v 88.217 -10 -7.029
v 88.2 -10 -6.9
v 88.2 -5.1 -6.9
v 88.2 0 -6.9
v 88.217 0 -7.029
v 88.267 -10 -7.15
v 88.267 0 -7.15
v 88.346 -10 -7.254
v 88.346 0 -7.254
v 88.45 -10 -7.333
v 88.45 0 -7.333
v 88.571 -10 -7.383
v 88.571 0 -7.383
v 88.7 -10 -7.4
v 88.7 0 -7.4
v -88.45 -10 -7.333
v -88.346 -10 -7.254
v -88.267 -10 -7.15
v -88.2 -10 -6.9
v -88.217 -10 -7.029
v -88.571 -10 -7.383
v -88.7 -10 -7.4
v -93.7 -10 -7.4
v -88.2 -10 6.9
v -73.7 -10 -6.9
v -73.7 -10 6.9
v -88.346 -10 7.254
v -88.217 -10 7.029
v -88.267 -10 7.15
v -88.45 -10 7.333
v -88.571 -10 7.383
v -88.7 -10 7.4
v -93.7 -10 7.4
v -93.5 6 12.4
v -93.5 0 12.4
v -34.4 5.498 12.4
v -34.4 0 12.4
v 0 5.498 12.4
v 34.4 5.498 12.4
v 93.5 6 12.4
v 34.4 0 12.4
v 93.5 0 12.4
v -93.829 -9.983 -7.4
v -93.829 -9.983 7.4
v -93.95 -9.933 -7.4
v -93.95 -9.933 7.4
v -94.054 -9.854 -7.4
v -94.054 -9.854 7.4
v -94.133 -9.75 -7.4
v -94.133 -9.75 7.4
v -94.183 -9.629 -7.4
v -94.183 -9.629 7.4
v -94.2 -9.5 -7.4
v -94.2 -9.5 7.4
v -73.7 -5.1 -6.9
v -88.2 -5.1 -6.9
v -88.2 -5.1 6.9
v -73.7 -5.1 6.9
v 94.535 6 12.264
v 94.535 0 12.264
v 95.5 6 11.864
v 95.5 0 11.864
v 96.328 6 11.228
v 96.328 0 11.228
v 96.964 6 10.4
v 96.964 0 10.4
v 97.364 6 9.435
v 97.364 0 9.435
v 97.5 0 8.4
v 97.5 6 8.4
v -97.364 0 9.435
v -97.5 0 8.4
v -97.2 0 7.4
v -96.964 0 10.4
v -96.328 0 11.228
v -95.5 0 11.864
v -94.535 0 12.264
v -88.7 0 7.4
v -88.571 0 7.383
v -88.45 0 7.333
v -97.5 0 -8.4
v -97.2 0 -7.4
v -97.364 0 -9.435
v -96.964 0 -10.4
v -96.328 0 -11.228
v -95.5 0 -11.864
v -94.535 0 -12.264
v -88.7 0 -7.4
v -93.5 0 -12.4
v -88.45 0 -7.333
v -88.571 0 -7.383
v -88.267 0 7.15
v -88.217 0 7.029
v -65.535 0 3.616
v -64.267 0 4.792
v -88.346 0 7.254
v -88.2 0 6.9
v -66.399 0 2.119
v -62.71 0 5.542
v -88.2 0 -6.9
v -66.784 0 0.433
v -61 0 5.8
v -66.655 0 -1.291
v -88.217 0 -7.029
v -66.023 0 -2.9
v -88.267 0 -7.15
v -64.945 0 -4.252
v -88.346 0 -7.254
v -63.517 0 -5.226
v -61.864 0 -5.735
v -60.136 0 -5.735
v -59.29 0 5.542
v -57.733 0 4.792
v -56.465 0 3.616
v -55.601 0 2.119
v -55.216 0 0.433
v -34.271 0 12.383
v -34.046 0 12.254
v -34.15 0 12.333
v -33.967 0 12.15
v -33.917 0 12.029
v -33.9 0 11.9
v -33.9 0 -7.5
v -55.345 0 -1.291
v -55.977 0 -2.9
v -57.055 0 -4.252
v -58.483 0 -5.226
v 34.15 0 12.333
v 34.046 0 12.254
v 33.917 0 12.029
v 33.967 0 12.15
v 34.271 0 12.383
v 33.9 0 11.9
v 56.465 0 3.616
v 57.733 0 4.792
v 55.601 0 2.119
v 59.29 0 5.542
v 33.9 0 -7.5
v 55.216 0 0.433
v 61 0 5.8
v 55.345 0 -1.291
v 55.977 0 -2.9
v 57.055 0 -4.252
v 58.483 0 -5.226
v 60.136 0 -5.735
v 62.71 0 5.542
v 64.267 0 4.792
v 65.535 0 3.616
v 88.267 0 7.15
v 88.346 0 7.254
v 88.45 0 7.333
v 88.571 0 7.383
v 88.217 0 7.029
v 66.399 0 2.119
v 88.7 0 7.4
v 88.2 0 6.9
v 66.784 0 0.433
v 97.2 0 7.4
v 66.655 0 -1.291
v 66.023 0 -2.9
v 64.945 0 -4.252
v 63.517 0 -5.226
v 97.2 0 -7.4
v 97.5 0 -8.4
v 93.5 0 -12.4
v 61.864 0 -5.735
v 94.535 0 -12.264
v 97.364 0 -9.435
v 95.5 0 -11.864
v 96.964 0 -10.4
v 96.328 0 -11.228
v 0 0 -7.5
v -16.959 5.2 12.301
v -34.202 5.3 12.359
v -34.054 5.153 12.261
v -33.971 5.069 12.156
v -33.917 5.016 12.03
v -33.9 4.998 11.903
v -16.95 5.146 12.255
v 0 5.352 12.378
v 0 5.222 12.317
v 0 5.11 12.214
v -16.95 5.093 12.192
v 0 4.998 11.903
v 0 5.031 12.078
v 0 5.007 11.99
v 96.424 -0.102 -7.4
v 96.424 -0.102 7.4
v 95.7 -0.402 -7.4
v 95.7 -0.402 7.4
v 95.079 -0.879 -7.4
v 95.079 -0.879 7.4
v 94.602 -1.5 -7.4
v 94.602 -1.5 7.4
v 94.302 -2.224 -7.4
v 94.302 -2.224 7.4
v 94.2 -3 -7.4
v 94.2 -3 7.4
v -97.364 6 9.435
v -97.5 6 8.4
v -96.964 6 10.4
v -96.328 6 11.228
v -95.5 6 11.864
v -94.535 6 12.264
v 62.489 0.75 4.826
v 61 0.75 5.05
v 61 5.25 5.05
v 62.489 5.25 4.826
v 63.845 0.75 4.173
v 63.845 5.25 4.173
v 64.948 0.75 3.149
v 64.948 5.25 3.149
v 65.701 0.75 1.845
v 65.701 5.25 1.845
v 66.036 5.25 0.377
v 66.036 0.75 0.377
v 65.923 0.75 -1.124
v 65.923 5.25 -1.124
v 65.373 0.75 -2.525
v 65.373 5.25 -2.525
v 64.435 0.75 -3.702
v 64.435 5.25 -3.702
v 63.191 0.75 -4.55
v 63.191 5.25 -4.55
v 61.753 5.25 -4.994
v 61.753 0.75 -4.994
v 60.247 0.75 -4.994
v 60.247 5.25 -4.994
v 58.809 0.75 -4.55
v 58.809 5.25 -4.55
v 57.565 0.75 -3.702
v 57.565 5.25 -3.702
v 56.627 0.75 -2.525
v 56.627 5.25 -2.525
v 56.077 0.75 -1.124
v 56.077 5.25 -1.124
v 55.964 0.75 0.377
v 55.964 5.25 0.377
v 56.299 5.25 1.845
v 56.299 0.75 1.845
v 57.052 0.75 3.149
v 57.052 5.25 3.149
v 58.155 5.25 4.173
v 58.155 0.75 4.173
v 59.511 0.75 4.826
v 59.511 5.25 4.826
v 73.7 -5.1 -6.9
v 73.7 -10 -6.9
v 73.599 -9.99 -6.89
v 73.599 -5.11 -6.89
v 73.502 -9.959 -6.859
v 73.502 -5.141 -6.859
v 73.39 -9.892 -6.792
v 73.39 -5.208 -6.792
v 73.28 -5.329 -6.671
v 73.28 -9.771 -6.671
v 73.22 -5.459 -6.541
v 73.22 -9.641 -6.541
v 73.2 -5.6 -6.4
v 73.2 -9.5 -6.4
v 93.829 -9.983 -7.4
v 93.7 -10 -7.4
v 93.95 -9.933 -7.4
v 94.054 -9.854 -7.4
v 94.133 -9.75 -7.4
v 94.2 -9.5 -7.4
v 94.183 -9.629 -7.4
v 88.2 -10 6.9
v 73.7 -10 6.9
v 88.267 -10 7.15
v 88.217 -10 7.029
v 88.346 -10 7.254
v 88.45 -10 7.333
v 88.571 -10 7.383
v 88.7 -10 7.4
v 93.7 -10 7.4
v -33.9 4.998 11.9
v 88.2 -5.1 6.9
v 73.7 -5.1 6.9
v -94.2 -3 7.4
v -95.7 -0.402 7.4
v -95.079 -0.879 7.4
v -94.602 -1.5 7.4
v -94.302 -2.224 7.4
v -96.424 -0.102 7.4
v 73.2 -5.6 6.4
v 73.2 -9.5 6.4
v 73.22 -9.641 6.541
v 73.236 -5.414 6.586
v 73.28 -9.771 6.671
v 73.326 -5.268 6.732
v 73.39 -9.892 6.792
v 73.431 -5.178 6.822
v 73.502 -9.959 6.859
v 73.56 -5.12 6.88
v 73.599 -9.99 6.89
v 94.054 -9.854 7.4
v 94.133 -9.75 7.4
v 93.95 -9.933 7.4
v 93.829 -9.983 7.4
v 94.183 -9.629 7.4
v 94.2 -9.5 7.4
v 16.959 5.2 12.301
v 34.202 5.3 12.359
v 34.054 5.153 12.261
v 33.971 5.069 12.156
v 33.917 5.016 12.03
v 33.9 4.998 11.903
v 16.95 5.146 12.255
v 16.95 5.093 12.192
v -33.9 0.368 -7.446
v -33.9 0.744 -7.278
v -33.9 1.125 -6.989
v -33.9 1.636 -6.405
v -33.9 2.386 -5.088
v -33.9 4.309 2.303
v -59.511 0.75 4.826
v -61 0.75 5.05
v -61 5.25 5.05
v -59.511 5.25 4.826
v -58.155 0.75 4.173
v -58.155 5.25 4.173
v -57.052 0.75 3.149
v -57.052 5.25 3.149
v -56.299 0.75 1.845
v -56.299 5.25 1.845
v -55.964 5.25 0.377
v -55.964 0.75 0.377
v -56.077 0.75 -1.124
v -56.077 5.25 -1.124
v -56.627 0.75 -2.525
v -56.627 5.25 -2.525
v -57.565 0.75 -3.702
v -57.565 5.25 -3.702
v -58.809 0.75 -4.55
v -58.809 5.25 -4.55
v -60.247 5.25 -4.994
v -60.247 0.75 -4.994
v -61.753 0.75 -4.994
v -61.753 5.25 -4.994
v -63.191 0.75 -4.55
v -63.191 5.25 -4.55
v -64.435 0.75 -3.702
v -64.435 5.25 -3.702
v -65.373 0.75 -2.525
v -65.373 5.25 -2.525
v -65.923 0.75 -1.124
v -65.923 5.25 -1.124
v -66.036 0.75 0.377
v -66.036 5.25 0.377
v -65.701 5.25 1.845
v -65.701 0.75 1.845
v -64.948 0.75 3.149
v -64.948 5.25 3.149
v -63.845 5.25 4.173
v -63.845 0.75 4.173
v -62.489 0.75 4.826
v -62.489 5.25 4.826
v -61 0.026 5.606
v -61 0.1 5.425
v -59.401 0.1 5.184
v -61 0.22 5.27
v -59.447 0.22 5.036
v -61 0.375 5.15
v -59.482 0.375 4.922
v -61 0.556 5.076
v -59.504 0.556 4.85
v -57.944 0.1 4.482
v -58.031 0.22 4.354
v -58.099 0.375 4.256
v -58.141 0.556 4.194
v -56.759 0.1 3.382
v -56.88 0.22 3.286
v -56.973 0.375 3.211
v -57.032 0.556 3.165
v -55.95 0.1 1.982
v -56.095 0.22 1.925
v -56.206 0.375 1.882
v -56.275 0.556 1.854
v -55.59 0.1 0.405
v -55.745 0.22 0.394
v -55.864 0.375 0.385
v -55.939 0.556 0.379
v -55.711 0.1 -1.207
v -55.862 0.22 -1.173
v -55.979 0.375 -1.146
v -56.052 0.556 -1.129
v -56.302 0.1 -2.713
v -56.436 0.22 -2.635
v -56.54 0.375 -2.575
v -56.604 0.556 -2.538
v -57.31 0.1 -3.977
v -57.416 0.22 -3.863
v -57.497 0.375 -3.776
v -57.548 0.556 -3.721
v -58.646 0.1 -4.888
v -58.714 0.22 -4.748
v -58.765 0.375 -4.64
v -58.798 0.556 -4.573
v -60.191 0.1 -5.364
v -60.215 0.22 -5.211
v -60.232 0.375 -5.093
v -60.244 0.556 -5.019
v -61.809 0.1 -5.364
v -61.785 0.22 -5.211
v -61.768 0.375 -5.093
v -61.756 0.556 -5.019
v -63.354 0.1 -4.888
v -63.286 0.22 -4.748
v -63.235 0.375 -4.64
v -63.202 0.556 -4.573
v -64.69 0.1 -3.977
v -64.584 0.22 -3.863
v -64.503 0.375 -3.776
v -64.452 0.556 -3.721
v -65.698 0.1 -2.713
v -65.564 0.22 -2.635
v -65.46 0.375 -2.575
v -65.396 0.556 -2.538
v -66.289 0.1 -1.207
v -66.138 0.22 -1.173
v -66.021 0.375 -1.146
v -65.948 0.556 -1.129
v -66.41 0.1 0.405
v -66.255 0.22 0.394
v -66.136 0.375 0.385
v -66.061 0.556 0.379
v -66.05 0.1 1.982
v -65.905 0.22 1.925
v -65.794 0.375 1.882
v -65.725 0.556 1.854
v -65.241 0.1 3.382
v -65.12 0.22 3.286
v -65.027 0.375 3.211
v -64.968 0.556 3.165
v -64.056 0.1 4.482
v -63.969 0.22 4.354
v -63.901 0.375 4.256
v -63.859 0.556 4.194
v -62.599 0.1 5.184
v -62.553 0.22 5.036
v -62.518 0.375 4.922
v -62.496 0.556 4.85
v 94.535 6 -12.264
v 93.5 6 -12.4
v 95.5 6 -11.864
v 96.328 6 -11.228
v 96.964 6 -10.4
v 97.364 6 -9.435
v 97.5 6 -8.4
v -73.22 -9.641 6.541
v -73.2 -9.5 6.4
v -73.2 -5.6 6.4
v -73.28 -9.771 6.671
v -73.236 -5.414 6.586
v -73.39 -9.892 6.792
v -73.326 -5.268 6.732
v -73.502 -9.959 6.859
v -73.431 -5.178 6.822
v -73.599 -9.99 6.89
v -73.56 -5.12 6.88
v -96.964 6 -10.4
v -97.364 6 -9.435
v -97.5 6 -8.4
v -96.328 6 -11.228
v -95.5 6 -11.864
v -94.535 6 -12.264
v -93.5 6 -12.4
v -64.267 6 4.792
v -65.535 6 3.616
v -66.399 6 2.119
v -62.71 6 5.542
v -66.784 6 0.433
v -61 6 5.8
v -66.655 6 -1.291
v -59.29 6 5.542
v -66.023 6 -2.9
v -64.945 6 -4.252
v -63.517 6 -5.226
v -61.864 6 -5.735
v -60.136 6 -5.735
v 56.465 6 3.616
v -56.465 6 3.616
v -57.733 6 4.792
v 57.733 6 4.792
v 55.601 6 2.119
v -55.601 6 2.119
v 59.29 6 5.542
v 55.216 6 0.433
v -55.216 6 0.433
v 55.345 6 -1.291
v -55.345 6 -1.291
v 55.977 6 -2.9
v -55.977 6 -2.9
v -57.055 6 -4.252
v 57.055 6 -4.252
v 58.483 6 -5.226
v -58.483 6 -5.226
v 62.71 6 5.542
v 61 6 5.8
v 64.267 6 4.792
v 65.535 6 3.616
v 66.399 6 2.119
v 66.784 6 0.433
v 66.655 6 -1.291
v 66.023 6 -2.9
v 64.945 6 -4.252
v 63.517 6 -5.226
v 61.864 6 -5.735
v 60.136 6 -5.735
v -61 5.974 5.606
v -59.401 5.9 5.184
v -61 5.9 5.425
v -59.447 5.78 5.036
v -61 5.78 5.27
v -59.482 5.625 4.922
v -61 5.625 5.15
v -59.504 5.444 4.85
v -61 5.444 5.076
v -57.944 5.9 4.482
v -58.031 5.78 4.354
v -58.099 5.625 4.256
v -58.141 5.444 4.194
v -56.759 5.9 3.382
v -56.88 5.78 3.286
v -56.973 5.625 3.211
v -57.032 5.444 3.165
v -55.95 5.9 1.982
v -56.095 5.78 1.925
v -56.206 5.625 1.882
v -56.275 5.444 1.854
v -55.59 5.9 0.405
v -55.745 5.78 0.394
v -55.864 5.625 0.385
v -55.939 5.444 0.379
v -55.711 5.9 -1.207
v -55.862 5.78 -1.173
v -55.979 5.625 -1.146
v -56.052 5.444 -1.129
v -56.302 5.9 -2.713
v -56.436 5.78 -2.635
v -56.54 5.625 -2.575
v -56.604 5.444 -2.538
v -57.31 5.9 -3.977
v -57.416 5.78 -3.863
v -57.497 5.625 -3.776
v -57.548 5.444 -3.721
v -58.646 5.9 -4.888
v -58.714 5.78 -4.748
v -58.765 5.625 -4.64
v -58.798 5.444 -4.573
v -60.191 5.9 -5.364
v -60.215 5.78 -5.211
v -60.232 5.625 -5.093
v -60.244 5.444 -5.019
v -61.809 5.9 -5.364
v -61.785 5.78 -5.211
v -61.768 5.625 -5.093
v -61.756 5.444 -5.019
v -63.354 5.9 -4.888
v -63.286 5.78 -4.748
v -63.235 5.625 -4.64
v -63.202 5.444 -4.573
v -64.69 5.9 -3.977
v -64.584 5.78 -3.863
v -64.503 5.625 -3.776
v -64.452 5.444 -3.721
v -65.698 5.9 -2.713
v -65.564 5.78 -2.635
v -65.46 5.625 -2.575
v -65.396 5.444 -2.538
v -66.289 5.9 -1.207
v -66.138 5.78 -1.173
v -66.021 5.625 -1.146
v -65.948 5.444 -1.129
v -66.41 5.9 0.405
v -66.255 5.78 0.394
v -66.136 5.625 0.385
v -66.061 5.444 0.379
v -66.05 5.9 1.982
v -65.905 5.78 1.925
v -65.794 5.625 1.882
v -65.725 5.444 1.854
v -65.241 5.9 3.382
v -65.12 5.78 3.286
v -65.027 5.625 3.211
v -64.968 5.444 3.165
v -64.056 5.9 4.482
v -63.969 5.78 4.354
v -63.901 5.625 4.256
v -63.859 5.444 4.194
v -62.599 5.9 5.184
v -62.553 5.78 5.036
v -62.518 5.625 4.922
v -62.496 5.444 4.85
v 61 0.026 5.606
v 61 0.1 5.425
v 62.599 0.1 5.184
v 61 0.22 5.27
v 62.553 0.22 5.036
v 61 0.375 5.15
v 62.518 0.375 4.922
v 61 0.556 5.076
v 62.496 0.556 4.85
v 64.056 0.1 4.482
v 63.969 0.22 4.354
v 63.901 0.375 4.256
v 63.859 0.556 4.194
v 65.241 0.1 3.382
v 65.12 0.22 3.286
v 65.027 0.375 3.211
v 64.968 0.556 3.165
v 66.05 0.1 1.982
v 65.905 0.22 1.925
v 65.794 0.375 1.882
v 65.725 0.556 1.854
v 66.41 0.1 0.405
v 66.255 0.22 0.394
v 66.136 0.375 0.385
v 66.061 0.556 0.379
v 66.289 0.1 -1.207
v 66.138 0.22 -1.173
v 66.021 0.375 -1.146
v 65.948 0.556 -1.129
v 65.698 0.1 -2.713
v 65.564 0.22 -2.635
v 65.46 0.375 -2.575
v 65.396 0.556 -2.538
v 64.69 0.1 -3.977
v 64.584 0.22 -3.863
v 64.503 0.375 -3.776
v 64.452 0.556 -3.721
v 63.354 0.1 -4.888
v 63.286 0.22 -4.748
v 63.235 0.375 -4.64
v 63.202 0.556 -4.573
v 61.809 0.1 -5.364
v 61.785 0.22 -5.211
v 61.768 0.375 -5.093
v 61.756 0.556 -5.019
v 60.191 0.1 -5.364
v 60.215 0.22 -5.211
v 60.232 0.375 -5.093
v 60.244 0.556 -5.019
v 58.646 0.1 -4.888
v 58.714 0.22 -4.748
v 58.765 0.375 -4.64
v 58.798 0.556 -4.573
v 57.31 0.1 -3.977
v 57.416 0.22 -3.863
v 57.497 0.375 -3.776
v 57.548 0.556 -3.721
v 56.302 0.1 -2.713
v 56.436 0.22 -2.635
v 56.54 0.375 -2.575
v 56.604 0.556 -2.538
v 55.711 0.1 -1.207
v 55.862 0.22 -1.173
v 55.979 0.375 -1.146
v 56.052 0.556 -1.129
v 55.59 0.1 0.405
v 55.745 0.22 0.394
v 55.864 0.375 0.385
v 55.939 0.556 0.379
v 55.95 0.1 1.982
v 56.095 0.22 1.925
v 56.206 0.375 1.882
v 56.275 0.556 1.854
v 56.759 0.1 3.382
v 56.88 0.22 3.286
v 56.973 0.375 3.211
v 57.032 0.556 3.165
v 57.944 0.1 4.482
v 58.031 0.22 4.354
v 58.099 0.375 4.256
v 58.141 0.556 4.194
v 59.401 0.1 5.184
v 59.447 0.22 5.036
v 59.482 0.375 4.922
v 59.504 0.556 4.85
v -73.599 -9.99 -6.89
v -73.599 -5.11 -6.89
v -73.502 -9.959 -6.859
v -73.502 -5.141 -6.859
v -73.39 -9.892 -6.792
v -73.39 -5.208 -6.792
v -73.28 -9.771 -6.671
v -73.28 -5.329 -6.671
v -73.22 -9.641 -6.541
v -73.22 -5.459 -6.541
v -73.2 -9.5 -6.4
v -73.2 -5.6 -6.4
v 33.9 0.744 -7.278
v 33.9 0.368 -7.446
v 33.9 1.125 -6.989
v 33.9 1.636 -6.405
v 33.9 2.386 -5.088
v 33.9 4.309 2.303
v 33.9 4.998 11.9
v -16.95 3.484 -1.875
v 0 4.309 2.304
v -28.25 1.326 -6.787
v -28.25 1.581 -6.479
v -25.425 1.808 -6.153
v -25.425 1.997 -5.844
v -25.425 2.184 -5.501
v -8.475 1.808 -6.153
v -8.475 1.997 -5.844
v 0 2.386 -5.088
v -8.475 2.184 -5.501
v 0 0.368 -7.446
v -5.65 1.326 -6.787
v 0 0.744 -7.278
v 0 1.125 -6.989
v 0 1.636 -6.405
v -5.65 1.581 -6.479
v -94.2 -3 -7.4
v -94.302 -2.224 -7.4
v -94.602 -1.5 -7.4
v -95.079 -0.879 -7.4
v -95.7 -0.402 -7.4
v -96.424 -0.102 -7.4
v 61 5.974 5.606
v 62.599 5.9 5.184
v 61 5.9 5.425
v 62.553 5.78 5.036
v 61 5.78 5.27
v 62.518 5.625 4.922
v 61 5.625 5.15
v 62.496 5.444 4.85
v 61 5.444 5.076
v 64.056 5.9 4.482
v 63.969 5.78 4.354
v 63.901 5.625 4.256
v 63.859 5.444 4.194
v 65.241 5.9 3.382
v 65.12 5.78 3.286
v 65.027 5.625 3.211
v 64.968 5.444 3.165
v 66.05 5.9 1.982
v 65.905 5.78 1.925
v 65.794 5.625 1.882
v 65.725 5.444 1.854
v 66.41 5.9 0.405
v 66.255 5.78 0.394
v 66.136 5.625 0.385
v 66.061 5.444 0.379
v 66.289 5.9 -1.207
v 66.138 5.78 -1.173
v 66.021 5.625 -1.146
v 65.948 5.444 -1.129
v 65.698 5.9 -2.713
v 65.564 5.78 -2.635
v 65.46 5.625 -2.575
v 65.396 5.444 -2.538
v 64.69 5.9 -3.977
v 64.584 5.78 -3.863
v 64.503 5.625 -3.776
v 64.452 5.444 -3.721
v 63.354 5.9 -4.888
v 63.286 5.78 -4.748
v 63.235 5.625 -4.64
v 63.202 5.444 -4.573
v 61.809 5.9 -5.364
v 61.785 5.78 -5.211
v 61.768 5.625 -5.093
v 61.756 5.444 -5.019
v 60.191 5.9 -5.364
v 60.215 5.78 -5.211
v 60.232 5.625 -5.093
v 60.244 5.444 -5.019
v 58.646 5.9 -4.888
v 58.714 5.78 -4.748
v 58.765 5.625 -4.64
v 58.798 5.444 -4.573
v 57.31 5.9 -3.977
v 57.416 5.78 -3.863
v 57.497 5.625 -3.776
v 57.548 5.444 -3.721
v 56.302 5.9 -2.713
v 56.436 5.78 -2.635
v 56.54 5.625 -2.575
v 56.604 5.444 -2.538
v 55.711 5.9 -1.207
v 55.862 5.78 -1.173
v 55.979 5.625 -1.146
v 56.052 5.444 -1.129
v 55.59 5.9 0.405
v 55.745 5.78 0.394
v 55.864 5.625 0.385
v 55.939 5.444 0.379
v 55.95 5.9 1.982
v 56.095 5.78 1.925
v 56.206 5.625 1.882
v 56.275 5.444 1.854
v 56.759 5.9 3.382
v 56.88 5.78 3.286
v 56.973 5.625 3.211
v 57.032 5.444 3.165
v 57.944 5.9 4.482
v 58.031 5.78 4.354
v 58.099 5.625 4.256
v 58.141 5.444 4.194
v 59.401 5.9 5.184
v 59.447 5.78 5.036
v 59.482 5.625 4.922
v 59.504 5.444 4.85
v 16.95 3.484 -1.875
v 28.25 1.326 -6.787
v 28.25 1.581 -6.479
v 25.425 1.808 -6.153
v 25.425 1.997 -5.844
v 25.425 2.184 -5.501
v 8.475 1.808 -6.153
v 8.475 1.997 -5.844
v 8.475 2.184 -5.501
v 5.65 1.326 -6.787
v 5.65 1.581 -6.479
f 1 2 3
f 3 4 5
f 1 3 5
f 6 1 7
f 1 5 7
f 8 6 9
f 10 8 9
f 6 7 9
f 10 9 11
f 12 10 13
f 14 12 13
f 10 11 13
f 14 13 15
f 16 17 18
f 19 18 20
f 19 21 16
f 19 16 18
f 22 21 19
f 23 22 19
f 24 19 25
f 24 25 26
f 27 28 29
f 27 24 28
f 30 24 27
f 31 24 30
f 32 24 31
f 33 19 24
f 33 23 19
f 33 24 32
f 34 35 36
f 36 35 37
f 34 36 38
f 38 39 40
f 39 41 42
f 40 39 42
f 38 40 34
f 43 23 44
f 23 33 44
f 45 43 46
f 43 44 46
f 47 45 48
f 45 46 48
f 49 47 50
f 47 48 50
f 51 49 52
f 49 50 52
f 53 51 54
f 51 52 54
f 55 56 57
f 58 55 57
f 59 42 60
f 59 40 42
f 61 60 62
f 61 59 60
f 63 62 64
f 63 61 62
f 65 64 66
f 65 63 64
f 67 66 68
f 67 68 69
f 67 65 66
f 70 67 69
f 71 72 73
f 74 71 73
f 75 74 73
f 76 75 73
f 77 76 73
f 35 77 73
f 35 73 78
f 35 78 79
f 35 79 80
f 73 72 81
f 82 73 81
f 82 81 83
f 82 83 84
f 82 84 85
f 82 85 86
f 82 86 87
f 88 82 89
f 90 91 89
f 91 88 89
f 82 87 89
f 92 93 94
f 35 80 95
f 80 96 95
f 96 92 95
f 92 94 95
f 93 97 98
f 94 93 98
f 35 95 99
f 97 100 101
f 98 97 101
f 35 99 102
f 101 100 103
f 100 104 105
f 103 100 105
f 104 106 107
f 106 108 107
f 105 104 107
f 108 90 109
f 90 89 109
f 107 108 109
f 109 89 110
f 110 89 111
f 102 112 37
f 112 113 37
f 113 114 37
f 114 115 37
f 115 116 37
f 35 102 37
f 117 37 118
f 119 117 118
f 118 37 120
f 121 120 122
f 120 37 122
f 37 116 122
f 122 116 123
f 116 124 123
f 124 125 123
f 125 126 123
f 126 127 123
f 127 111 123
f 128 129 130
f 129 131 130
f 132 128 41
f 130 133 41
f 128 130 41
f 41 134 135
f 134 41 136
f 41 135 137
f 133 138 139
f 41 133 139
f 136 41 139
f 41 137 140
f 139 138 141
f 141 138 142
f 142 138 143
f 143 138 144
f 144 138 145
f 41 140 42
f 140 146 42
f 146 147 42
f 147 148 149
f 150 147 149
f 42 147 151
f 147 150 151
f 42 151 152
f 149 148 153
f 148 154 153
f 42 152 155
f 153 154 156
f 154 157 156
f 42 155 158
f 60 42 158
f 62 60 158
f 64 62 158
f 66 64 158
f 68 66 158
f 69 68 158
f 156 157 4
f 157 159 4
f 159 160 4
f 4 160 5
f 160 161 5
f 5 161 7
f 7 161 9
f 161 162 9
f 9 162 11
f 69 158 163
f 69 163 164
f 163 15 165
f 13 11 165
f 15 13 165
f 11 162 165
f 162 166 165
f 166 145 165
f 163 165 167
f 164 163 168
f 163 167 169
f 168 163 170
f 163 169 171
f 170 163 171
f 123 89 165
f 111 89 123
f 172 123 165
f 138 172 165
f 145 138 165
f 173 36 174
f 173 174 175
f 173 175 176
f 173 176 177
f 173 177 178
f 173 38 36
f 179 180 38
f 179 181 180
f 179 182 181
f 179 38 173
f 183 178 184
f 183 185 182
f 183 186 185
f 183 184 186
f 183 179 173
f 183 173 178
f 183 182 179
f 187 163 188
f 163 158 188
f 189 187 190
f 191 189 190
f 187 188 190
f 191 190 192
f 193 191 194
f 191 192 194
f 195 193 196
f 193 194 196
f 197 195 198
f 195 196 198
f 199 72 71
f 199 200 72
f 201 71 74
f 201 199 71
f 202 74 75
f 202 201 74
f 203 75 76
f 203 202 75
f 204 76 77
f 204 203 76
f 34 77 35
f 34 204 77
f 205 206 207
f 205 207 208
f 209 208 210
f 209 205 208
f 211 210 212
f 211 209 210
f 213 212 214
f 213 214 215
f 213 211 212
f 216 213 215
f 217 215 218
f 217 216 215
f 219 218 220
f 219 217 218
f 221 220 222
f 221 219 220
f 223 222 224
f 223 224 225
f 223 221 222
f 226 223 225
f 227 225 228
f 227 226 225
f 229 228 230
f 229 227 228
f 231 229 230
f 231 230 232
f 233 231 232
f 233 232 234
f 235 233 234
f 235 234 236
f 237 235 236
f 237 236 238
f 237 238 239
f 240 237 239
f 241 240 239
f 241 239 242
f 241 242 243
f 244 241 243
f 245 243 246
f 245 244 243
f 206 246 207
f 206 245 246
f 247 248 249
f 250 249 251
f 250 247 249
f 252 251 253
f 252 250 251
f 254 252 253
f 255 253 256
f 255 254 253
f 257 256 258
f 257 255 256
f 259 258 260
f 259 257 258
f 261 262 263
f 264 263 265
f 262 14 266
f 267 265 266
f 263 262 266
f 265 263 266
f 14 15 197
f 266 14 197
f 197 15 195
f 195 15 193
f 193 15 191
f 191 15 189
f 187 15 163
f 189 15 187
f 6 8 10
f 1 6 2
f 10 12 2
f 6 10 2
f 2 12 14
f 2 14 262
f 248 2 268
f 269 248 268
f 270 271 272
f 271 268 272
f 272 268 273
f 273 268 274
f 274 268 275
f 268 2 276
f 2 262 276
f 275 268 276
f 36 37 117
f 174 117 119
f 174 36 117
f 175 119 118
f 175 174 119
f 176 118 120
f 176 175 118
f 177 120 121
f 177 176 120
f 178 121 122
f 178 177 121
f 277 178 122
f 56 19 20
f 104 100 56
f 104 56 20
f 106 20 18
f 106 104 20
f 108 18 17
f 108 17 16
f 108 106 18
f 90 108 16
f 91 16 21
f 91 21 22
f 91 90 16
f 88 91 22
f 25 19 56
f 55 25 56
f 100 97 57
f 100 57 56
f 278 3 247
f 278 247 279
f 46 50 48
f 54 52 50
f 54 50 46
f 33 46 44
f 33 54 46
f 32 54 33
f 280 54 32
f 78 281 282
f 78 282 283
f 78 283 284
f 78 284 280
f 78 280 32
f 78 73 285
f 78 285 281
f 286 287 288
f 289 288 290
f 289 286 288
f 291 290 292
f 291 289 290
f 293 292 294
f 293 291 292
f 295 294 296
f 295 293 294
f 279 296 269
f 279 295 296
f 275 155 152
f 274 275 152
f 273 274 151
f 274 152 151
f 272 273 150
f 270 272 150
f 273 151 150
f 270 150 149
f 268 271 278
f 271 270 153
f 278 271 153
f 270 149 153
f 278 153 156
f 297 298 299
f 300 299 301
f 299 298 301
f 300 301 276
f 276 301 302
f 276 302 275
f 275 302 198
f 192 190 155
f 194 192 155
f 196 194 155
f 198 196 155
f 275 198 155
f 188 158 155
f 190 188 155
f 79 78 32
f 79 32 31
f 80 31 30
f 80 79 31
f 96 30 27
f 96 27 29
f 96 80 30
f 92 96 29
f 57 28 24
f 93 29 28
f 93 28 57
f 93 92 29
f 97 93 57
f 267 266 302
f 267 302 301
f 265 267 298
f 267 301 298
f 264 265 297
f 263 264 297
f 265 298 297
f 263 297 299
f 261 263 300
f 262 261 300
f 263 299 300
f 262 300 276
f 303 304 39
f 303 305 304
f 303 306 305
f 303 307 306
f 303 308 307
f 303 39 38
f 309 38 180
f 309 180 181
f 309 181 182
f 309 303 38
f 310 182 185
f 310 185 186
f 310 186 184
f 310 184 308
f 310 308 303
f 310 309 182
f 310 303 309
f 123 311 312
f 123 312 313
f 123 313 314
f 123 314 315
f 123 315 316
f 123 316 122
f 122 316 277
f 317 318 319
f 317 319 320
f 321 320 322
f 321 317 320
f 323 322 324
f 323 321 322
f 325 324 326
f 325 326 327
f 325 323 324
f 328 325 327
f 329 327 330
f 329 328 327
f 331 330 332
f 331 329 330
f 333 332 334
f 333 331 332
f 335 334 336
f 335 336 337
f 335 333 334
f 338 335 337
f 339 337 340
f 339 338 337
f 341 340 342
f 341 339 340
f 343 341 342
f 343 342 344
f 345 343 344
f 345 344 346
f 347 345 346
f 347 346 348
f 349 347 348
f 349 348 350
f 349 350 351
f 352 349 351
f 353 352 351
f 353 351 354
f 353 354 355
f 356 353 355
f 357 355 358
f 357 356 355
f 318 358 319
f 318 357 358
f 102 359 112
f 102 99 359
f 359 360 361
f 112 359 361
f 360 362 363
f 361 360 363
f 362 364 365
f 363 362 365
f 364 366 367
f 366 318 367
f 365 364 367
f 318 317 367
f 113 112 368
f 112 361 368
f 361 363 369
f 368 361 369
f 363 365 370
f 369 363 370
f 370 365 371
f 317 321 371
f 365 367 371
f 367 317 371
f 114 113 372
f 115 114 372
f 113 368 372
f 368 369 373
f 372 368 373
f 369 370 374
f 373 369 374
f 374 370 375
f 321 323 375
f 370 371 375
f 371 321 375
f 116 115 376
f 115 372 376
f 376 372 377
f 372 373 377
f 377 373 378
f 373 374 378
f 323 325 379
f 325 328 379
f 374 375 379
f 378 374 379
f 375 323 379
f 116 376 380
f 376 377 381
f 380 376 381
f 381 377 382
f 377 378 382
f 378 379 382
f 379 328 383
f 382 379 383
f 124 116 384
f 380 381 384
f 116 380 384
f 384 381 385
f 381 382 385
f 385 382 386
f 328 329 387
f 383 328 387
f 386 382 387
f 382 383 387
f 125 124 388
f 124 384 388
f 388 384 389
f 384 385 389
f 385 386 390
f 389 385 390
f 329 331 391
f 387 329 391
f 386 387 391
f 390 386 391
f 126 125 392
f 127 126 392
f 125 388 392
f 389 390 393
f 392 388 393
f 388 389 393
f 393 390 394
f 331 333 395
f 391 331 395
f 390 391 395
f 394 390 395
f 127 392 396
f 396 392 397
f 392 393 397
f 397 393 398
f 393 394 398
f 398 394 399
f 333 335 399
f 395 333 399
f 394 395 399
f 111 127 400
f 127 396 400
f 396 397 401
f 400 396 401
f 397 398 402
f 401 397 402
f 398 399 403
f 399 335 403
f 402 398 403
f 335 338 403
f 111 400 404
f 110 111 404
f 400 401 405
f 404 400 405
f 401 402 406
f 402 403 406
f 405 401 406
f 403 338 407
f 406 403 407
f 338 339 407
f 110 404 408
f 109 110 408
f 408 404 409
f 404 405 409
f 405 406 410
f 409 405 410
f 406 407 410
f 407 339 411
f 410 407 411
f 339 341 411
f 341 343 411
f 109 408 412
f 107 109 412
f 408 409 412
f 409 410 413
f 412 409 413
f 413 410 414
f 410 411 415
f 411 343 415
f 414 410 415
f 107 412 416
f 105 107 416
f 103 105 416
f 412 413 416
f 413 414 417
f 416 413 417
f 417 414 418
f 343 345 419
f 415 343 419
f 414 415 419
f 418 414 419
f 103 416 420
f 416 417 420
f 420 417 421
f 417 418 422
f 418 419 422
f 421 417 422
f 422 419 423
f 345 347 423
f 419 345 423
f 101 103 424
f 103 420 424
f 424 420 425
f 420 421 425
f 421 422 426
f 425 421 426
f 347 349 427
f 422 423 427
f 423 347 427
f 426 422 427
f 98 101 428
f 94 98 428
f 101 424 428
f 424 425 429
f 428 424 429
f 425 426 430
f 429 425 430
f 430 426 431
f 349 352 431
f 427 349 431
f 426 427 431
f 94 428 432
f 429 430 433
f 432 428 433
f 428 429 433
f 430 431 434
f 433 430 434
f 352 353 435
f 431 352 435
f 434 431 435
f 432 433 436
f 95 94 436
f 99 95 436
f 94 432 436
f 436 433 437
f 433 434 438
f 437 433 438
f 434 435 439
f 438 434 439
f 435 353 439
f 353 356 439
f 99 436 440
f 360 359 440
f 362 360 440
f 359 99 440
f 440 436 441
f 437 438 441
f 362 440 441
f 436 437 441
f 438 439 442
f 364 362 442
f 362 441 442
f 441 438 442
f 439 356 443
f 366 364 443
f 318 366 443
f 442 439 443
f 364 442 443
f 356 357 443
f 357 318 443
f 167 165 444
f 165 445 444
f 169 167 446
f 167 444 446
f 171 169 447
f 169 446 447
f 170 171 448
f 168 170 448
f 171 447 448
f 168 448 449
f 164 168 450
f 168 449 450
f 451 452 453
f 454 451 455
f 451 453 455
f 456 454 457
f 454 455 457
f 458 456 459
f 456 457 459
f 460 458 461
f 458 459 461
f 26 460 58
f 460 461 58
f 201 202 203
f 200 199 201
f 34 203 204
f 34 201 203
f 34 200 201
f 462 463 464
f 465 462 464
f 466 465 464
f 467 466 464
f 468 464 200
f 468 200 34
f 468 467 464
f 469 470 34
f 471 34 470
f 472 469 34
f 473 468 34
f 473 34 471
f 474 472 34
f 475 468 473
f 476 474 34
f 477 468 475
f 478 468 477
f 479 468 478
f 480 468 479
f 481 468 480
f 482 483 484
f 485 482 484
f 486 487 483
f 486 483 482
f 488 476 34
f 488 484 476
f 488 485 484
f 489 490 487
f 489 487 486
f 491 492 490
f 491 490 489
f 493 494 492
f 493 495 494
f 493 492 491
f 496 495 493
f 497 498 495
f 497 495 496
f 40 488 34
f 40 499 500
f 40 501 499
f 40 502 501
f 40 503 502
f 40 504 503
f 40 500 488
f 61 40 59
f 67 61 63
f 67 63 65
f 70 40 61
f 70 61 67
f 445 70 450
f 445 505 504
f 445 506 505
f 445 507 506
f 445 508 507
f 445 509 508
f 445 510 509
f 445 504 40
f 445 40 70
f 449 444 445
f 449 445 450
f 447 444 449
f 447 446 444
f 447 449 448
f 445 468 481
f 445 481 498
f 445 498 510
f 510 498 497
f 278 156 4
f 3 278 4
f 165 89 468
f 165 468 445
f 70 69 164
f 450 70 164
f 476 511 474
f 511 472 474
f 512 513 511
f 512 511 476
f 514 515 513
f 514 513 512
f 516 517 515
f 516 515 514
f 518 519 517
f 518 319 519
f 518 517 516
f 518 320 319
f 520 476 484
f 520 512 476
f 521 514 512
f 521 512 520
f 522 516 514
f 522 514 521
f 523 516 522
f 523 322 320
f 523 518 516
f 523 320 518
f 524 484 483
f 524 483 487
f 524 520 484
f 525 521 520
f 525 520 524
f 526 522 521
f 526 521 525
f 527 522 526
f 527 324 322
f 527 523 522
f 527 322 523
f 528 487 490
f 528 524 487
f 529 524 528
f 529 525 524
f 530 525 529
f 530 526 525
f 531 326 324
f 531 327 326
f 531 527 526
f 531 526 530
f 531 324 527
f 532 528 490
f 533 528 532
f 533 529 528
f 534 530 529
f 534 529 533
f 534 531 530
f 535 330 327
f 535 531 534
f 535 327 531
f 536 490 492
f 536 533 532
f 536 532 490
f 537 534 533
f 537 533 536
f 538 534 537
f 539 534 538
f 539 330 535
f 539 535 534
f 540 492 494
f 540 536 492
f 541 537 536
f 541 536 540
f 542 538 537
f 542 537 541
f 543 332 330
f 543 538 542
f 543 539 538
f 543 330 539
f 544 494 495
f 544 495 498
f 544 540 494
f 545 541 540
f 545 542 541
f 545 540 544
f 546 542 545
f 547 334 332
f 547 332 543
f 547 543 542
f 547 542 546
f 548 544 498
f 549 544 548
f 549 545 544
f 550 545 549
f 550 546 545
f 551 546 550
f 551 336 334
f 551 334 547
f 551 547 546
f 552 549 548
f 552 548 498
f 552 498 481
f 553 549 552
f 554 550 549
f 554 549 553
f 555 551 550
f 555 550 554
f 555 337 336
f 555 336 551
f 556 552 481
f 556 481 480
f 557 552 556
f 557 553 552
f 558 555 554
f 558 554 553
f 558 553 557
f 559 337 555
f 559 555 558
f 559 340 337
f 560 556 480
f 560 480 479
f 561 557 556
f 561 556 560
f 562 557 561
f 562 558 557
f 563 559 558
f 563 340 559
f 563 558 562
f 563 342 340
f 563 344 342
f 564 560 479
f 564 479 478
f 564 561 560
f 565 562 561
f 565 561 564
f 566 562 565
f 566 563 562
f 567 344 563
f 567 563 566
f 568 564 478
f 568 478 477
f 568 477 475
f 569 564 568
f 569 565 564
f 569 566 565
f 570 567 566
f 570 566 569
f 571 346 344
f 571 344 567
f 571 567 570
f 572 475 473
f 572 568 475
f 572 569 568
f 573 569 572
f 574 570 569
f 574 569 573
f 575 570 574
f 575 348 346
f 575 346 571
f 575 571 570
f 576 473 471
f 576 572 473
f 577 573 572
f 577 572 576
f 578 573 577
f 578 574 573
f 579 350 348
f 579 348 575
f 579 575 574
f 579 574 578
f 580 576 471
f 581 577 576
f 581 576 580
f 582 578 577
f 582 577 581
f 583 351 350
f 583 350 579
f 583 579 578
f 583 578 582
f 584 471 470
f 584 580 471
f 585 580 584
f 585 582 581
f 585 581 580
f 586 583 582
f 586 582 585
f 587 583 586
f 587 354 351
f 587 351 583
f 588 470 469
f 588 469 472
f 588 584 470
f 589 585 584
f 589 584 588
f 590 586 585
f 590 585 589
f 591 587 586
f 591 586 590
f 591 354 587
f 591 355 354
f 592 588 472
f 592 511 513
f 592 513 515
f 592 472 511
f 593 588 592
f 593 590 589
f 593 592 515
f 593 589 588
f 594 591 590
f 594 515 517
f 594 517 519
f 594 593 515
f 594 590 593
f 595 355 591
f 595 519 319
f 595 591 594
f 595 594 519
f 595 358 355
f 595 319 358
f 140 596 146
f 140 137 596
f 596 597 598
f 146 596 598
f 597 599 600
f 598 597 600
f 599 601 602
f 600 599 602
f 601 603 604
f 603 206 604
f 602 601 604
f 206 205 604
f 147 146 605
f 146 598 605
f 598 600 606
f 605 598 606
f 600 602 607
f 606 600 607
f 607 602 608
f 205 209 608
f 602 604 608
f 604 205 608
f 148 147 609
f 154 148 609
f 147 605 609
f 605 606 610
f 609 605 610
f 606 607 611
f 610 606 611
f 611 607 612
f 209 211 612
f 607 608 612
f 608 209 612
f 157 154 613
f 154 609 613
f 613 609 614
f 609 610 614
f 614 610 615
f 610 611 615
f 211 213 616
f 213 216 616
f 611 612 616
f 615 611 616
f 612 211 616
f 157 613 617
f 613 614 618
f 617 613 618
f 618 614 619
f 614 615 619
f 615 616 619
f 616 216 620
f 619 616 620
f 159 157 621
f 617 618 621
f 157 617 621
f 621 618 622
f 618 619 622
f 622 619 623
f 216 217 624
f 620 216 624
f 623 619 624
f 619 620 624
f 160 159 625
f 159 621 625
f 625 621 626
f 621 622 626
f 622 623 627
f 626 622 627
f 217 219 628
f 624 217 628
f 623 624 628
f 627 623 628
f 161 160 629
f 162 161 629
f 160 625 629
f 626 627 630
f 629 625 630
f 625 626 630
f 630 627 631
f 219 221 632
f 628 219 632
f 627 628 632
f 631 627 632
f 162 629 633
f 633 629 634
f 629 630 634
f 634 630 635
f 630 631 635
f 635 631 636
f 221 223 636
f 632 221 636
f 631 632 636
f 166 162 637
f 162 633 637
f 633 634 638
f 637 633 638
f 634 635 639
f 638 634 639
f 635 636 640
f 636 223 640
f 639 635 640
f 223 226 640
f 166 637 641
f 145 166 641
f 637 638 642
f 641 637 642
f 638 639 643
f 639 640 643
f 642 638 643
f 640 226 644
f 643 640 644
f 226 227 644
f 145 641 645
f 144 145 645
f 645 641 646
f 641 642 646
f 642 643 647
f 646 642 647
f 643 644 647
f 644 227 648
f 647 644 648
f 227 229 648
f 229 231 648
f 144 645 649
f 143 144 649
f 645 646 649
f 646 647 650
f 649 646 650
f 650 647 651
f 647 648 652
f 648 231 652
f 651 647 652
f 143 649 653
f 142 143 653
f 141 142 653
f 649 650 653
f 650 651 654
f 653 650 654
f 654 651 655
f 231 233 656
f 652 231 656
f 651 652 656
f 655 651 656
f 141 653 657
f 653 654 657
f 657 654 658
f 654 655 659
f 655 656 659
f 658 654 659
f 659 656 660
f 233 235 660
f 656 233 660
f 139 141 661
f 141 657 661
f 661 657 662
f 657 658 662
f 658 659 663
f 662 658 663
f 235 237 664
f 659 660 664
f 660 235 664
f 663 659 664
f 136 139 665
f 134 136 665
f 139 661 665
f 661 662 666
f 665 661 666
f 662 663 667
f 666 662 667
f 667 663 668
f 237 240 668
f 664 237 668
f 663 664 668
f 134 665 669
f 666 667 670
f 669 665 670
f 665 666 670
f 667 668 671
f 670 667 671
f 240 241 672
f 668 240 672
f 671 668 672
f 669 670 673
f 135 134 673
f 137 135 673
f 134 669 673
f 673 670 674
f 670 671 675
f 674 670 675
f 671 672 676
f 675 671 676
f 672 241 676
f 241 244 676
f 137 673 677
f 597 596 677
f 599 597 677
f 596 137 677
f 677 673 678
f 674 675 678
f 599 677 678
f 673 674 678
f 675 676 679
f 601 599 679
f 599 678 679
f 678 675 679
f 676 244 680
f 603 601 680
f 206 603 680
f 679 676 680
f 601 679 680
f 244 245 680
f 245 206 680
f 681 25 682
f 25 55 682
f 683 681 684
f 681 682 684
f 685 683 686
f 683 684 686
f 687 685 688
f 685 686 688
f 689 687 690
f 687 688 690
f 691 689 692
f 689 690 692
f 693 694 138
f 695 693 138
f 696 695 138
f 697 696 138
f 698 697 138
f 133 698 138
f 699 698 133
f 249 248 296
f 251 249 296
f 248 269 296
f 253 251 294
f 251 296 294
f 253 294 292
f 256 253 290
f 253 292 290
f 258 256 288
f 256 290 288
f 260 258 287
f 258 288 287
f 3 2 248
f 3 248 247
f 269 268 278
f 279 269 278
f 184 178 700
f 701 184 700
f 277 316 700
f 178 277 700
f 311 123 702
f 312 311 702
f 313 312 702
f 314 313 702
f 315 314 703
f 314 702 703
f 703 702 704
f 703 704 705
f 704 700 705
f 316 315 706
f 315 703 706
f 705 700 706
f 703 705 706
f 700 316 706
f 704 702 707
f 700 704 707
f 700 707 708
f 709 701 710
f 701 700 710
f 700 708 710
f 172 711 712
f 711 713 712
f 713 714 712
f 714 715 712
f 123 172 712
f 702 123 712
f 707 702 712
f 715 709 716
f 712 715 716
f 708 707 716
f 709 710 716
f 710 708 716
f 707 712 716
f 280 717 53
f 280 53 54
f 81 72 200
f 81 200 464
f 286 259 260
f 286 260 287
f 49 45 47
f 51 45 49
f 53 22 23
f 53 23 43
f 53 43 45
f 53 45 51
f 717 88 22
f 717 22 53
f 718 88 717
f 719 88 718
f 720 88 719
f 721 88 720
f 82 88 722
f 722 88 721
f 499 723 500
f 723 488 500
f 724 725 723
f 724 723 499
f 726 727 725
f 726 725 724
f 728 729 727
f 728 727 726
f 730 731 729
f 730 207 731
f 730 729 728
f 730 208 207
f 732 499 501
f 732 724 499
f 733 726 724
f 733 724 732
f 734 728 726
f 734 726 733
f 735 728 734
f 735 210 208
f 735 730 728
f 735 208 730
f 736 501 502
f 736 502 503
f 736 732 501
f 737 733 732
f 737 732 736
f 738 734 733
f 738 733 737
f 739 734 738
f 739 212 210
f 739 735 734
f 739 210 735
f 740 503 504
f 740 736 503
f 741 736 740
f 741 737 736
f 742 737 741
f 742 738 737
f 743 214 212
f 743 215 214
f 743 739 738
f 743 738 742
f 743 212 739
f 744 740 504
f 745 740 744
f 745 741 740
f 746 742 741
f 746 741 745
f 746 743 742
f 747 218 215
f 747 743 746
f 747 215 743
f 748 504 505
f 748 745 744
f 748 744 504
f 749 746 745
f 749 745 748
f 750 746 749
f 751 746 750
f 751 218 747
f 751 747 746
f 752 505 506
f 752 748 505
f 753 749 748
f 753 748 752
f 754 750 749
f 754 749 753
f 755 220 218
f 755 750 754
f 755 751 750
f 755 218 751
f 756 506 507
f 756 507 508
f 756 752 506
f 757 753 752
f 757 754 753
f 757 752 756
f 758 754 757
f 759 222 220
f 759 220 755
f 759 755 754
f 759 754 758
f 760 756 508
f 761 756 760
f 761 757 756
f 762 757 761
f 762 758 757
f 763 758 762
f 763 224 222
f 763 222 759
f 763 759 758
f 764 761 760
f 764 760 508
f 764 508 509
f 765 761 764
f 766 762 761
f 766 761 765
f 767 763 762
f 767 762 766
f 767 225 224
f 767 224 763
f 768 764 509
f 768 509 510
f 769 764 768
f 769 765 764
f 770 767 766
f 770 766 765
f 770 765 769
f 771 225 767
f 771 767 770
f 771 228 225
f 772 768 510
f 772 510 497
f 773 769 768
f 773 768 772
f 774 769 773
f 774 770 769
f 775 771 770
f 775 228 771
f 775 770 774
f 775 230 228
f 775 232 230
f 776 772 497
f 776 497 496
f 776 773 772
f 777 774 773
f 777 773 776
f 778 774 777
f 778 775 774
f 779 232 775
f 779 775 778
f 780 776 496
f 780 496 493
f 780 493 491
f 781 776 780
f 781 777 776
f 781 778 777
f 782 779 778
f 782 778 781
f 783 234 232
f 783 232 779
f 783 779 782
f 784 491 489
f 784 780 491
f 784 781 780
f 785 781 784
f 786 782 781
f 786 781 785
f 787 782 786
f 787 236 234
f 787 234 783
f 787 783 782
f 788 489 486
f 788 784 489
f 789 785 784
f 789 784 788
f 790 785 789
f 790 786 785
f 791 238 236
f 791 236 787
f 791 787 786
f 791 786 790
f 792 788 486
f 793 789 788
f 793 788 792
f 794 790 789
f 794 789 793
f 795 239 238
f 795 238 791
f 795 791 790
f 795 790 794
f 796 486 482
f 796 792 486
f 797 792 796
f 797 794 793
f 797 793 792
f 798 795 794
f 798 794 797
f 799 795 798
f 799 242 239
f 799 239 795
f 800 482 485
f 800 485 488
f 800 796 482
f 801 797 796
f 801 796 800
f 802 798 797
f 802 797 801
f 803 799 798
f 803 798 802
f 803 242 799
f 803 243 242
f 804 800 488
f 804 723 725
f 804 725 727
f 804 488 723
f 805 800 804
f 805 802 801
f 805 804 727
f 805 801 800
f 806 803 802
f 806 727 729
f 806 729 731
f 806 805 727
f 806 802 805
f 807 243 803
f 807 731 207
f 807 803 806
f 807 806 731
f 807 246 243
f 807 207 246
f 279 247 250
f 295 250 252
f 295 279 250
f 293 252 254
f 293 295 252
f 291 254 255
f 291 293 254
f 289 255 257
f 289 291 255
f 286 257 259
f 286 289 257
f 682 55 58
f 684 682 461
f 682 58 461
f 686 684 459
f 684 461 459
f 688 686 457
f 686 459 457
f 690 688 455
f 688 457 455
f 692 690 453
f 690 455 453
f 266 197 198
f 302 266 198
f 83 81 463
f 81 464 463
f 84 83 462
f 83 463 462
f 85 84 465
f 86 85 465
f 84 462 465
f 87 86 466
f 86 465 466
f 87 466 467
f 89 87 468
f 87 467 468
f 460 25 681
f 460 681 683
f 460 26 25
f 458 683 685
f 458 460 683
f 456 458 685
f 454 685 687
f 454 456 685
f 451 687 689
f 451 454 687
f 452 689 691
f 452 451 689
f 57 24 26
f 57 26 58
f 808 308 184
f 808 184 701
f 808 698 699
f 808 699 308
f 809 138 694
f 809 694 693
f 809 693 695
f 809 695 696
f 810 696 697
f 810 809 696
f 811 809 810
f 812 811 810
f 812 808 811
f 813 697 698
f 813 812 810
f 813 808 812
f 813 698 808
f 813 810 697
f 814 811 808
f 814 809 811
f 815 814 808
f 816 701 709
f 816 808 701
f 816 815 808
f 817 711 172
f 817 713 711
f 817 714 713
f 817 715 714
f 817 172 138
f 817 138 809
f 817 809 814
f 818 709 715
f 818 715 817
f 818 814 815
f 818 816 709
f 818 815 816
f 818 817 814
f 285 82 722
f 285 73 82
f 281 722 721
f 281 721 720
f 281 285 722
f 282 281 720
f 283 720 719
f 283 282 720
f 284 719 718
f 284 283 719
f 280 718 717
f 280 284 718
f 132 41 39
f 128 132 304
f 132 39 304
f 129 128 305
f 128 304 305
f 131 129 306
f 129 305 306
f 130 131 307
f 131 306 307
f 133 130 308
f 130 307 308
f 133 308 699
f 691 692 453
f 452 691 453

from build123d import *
from OCP.BRepFilletAPI import BRepFilletAPI_MakeFillet

# Parameters (mm, degrees)
SKETCH1_W             = 195
SKETCH1_H             = 24.8
SKETCH1_R             = 5.05
BOSS_EXTRUDE1_DEPTH   = 6
CUT_EXTRUDE1_DEPTH    = 33.9
FILLET1_R1            = 0.75
FILLET1_R2            = 4
FILLET1_R3            = 0.5
BOSS_EXTRUDE2_DEPTH   = 10
FILLET2_R1            = 3
FILLET2_R2            = 0.5
SKETCH5_W             = 13.8
SKETCH5_H             = 4.9
BOSS_EXTRUDE4_DEPTH   = 15
FILLET3_R             = 0.5
FILLET2_OF_MIRROR2_R1 = 3
FILLET2_OF_MIRROR2_R2 = 0.5
FILLET3_OF_MIRROR2_R  = 0.5


with BuildPart() as part:
    # Sketch1 → Boss-Extrude1 (new body)
    with BuildSketch(Plane(origin=(0, 0, 0), x_dir=(1, 0, 0), z_dir=(0, 1, 0))):
        Rectangle(SKETCH1_W, SKETCH1_H)
        with Locations(Location((-61, 0, 0), (0, 0, 270))):
            Circle(SKETCH1_R, mode=Mode.SUBTRACT)
        with Locations(Location((61, 0, 0), (0, 0, 270))):
            Circle(SKETCH1_R, mode=Mode.SUBTRACT)
    extrude(amount=BOSS_EXTRUDE1_DEPTH)

    # Sketch2 → Cut-Extrude1 (cut, symmetric)
    with BuildSketch(Plane(origin=(0, 0, 0), x_dir=(0, 0, -1), z_dir=(1, 0, 0))):
        with BuildLine():
            Line((-12.4, 0), (-12.4, 5))
            add(Edge.make_bspline(
                [(7.5, 0), (7.5, 5), (-12.4, 5)],
                knots=[3.141592654, 3.141592654, 3.141592654, 4.71238898, 4.71238898, 4.71238898], degree=2, weights=[1, 0.707106781, 1]))
            Line((7.5, 0), (-12.4, 0))
        make_face()
    extrude(amount=CUT_EXTRUDE1_DEPTH, both=True, mode=Mode.SUBTRACT)

    # Fillet1: one fillet with a radius per group of edges: ONE call of the kernel's fillet builder (fillet() takes one radius for all edges)
    fillet1_edges_1 = [part.edges().sort_by_distance(p)[0] for p in [
        (-61, 0, -5.05),
        (-61, 6, -5.05),
        (61, 0, -5.05),
        (61, 6, -5.05),
    ]]
    fillet1_edges_2 = [part.edges().sort_by_distance(p)[0] for p in [
        (97.5, 3, 12.4),
        (-97.5, 3, 12.4),
        (-97.5, 3, -12.4),
        (97.5, 3, -12.4),
    ]]
    fillet1_edges_3 = [part.edges().sort_by_distance(p)[0] for p in [
        (-33.9, 2.5, 12.4),
        (16.95, 5, 12.4),
        (33.9, 2.5, 12.4),
    ]]
    fillet1 = BRepFilletAPI_MakeFillet(part.part.solid().wrapped)
    for e in fillet1_edges_1:
        fillet1.Add(FILLET1_R1, e.wrapped)
    for e in fillet1_edges_2:
        fillet1.Add(FILLET1_R2, e.wrapped)
    for e in fillet1_edges_3:
        fillet1.Add(FILLET1_R3, e.wrapped)
    add(Compound.cast(fillet1.Shape()), mode=Mode.REPLACE)

    # Sketch3 → Boss-Extrude2 (add)
    with BuildSketch(Plane.XZ):
        with BuildLine():
            Line((88.7, -7.4), (94.2, -7.4))
            Line((94.2, -7.4), (94.2, 7.4))
            Line((94.2, 7.4), (88.7, 7.4))
            ThreePointArc((88.7, 7.4), (88.346446609, 7.253553391), (88.2, 6.9))
            Line((88.2, 6.9), (88.2, -6.9))
            ThreePointArc((88.2, -6.9), (88.346446609, -7.253553391), (88.7, -7.4))
        make_face()
    boss_extrude2 = extrude(amount=BOSS_EXTRUDE2_DEPTH)

    # Fillet2: one fillet with a radius per group of edges: ONE call of the kernel's fillet builder (fillet() takes one radius for all edges)
    fillet2_edges_1 = [part.edges().sort_by_distance(p)[0] for p in [
        (94.2, 0, 0),
    ]]
    fillet2_edges_2 = [part.edges().sort_by_distance(p)[0] for p in [
        (94.2, -10, 0),
    ]]
    fillet2 = BRepFilletAPI_MakeFillet(part.part.solid().wrapped)
    for e in fillet2_edges_1:
        fillet2.Add(FILLET2_R1, e.wrapped)
    for e in fillet2_edges_2:
        fillet2.Add(FILLET2_R2, e.wrapped)
    add(Compound.cast(fillet2.Shape()), mode=Mode.REPLACE)

    # Sketch5 → Boss-Extrude4 (add)
    with BuildSketch(Plane.ZY.offset(-88.2)):
        with Locations((0, -7.55)):
            Rectangle(SKETCH5_W, SKETCH5_H)
    boss_extrude4 = extrude(amount=BOSS_EXTRUDE4_DEPTH)

    # Fillet3
    fillet3_edges = [part.edges().sort_by_distance(p)[0] for p in [
        (73.2, -7.55, -6.9),
        (73.2, -10, 0),
        (73.2, -7.55, 6.9),
        (73.2, -5.1, 0),
    ]]
    fillet(fillet3_edges, radius=FILLET3_R)

    # Mirror2: Boss-Extrude2, Boss-Extrude4 across plane
    add(boss_extrude2.mirror(Plane(origin=(0, 0, 0), x_dir=(0, 0, 1), z_dir=(1, 0, 0))))
    add(boss_extrude4.mirror(Plane(origin=(0, 0, 0), x_dir=(0, 0, 1), z_dir=(1, 0, 0))))

    # Fillet2 of Mirror2: one fillet with a radius per group of edges: ONE call of the kernel's fillet builder (fillet() takes one radius for all edges)
    fillet2_of_mirror2_edges_1 = [part.edges().sort_by_distance(p)[0] for p in [
        (-94.2, 0, 0),
    ]]
    fillet2_of_mirror2_edges_2 = [part.edges().sort_by_distance(p)[0] for p in [
        (-94.2, -10, 0),
    ]]
    fillet2_of_mirror2 = BRepFilletAPI_MakeFillet(part.part.solid().wrapped)
    for e in fillet2_of_mirror2_edges_1:
        fillet2_of_mirror2.Add(FILLET2_OF_MIRROR2_R1, e.wrapped)
    for e in fillet2_of_mirror2_edges_2:
        fillet2_of_mirror2.Add(FILLET2_OF_MIRROR2_R2, e.wrapped)
    add(Compound.cast(fillet2_of_mirror2.Shape()), mode=Mode.REPLACE)

    # Fillet3 of Mirror2
    fillet3_of_mirror2_edges = [part.edges().sort_by_distance(p)[0] for p in [
        (-73.2, -7.55, -6.9),
        (-73.2, -10, 0),
        (-73.2, -7.55, 6.9),
        (-73.2, -5.1, 0),
    ]]
    fillet(fillet3_of_mirror2_edges, radius=FILLET3_OF_MIRROR2_R)


solid = part.part
